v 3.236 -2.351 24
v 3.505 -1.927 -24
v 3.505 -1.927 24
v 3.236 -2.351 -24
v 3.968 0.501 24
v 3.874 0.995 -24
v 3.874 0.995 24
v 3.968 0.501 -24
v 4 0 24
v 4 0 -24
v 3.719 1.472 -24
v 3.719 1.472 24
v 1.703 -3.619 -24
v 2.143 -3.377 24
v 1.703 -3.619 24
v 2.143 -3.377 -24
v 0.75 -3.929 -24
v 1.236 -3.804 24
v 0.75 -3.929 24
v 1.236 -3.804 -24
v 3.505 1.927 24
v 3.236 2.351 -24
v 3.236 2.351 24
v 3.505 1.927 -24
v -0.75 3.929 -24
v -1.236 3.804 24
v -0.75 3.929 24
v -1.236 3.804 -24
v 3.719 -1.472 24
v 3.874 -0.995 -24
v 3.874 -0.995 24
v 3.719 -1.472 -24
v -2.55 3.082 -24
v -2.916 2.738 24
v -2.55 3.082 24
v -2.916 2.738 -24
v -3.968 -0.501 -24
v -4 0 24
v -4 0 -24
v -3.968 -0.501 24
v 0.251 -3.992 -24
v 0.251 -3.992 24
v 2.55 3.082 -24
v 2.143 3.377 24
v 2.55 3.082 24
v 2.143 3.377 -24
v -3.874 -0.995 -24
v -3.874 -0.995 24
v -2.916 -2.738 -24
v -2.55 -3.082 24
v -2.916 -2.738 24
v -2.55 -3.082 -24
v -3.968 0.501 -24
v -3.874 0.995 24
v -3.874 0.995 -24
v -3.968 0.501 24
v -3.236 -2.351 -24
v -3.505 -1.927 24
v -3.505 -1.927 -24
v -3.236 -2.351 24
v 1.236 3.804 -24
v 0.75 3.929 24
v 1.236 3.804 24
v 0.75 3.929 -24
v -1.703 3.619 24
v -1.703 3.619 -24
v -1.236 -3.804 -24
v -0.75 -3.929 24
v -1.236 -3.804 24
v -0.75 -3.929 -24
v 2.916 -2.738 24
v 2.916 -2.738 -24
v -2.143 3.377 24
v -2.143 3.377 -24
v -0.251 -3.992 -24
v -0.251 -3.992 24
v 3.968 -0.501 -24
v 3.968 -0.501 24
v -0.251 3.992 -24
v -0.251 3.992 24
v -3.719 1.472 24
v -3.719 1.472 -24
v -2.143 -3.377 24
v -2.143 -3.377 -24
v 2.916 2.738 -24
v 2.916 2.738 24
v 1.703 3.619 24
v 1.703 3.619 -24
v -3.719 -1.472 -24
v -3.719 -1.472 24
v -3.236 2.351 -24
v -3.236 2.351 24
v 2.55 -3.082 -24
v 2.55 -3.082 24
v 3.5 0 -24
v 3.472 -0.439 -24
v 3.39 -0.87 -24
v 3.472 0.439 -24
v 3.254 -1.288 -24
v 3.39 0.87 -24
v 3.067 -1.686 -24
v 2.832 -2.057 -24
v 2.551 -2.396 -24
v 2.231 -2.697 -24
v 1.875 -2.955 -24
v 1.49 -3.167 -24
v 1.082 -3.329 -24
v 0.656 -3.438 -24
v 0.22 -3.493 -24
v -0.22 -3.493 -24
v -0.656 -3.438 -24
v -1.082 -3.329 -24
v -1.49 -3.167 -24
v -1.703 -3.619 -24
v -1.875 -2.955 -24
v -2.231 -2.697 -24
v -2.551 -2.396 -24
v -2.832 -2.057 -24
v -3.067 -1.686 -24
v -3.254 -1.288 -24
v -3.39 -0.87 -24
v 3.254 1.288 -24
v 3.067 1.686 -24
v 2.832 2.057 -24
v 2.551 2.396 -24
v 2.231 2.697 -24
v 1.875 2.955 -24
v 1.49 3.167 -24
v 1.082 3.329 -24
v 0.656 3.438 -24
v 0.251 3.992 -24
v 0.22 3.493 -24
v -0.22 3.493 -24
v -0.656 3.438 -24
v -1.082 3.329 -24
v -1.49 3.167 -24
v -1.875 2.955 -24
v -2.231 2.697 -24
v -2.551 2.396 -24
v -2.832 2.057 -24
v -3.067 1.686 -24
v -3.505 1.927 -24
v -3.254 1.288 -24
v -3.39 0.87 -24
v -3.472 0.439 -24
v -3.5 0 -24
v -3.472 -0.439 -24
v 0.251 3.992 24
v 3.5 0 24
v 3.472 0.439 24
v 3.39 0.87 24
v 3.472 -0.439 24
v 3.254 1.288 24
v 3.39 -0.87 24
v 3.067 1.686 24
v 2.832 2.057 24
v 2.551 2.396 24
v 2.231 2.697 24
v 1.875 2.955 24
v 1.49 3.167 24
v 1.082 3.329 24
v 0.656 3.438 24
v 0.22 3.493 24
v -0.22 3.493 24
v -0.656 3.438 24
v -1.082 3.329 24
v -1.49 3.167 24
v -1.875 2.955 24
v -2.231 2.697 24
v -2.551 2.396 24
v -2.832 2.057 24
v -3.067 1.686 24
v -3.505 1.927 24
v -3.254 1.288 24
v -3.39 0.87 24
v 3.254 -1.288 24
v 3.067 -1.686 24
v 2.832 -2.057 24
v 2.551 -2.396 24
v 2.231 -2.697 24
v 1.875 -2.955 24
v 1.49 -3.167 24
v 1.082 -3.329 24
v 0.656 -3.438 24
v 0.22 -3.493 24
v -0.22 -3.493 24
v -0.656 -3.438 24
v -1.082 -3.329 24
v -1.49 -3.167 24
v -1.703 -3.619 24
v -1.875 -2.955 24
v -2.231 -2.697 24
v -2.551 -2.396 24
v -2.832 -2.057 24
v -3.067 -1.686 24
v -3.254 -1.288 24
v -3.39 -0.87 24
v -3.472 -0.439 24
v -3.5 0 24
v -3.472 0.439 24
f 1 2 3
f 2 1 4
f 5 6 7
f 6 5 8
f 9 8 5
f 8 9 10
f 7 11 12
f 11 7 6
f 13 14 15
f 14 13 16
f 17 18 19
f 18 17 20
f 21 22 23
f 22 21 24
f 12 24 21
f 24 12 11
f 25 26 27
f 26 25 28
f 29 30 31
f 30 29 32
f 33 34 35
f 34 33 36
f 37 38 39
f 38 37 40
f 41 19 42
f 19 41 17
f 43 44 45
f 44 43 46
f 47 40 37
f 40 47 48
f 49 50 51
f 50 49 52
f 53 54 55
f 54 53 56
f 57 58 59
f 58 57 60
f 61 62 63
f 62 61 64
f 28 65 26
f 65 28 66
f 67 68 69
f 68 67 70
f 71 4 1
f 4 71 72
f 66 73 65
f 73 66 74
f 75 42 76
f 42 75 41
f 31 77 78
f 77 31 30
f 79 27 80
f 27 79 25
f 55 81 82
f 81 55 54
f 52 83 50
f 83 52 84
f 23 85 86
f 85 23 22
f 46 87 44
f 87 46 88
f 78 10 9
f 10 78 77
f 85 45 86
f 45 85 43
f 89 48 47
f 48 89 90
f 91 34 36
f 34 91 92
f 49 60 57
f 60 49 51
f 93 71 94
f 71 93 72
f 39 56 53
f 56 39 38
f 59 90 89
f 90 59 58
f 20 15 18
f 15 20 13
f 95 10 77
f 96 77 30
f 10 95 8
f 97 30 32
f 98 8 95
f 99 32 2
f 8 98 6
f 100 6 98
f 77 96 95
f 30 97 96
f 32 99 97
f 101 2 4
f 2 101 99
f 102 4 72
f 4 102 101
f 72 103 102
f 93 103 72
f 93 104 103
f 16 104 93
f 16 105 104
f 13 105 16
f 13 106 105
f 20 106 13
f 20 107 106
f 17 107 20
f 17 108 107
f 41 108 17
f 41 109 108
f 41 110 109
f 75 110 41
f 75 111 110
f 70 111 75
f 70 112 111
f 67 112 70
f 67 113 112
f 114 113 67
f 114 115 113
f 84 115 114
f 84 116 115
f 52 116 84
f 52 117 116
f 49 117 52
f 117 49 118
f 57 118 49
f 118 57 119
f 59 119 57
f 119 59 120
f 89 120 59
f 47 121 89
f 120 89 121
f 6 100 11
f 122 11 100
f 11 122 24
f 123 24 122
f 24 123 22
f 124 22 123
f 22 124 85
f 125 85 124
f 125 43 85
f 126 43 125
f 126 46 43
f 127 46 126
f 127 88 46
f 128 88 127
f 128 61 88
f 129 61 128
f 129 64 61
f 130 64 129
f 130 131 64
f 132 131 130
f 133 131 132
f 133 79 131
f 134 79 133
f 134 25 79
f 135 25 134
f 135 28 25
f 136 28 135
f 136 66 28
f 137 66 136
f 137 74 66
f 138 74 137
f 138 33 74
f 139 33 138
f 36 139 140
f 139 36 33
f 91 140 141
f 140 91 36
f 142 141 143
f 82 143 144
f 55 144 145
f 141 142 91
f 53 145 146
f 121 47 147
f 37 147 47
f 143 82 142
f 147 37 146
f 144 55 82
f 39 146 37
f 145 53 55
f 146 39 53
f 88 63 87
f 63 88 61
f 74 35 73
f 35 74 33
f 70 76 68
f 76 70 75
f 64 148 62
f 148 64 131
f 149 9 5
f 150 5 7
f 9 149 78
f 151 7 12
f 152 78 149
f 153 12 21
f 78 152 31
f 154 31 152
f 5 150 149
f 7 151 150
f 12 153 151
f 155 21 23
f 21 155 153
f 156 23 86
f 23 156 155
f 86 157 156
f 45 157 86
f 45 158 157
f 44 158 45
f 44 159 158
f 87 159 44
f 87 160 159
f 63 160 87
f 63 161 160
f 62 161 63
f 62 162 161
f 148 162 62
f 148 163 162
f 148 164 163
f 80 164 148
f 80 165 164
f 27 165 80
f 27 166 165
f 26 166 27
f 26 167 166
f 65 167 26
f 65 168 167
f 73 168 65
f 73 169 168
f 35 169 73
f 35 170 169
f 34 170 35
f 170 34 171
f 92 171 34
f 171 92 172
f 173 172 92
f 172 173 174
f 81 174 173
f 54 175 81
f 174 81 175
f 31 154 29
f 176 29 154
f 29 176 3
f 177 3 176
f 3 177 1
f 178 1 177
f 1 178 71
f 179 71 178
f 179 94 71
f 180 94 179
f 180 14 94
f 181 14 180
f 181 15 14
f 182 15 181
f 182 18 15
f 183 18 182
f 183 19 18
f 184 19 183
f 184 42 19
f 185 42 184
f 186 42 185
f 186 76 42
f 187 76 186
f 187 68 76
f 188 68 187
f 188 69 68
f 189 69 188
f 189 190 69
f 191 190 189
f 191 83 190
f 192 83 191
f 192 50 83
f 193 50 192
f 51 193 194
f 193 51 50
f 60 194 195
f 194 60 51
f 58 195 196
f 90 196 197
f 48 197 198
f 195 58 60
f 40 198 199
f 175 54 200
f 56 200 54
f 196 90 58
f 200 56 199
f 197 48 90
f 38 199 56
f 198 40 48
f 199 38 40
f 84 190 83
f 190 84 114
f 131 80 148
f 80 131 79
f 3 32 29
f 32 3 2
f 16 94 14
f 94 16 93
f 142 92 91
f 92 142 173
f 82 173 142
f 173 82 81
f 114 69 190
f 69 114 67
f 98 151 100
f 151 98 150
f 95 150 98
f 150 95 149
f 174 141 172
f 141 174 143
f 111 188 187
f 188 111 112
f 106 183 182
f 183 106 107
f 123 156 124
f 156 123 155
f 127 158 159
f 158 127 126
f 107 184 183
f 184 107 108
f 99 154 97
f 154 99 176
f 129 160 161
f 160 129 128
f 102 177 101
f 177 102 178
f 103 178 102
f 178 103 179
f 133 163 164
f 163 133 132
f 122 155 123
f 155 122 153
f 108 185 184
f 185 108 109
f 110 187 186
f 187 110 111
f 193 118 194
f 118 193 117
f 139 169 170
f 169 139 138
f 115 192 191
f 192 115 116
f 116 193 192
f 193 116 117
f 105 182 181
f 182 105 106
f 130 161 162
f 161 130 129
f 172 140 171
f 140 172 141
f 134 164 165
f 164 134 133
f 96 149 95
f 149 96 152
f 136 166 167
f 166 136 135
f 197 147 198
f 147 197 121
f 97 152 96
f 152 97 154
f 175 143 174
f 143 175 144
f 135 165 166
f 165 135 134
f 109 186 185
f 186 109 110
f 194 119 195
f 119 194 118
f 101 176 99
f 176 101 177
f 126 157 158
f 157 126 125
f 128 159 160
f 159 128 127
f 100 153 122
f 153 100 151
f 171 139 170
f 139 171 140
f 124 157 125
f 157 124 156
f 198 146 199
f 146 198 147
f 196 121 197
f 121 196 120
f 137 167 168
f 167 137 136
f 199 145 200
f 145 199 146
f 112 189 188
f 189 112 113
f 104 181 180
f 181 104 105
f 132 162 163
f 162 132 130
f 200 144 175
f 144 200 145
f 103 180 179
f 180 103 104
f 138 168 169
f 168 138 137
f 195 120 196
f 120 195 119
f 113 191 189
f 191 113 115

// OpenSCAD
$fn = 50;


difference() {
	union() {
		translate(v = [0, 0, -24.0000000000]) {
			cylinder(h = 48, r = 4.0000000000);
		}
	}
	union() {
		translate(v = [0, 0, -100.0000000000]) {
			cylinder(h = 200, r = 3.5000000000);
		}
	}
}
